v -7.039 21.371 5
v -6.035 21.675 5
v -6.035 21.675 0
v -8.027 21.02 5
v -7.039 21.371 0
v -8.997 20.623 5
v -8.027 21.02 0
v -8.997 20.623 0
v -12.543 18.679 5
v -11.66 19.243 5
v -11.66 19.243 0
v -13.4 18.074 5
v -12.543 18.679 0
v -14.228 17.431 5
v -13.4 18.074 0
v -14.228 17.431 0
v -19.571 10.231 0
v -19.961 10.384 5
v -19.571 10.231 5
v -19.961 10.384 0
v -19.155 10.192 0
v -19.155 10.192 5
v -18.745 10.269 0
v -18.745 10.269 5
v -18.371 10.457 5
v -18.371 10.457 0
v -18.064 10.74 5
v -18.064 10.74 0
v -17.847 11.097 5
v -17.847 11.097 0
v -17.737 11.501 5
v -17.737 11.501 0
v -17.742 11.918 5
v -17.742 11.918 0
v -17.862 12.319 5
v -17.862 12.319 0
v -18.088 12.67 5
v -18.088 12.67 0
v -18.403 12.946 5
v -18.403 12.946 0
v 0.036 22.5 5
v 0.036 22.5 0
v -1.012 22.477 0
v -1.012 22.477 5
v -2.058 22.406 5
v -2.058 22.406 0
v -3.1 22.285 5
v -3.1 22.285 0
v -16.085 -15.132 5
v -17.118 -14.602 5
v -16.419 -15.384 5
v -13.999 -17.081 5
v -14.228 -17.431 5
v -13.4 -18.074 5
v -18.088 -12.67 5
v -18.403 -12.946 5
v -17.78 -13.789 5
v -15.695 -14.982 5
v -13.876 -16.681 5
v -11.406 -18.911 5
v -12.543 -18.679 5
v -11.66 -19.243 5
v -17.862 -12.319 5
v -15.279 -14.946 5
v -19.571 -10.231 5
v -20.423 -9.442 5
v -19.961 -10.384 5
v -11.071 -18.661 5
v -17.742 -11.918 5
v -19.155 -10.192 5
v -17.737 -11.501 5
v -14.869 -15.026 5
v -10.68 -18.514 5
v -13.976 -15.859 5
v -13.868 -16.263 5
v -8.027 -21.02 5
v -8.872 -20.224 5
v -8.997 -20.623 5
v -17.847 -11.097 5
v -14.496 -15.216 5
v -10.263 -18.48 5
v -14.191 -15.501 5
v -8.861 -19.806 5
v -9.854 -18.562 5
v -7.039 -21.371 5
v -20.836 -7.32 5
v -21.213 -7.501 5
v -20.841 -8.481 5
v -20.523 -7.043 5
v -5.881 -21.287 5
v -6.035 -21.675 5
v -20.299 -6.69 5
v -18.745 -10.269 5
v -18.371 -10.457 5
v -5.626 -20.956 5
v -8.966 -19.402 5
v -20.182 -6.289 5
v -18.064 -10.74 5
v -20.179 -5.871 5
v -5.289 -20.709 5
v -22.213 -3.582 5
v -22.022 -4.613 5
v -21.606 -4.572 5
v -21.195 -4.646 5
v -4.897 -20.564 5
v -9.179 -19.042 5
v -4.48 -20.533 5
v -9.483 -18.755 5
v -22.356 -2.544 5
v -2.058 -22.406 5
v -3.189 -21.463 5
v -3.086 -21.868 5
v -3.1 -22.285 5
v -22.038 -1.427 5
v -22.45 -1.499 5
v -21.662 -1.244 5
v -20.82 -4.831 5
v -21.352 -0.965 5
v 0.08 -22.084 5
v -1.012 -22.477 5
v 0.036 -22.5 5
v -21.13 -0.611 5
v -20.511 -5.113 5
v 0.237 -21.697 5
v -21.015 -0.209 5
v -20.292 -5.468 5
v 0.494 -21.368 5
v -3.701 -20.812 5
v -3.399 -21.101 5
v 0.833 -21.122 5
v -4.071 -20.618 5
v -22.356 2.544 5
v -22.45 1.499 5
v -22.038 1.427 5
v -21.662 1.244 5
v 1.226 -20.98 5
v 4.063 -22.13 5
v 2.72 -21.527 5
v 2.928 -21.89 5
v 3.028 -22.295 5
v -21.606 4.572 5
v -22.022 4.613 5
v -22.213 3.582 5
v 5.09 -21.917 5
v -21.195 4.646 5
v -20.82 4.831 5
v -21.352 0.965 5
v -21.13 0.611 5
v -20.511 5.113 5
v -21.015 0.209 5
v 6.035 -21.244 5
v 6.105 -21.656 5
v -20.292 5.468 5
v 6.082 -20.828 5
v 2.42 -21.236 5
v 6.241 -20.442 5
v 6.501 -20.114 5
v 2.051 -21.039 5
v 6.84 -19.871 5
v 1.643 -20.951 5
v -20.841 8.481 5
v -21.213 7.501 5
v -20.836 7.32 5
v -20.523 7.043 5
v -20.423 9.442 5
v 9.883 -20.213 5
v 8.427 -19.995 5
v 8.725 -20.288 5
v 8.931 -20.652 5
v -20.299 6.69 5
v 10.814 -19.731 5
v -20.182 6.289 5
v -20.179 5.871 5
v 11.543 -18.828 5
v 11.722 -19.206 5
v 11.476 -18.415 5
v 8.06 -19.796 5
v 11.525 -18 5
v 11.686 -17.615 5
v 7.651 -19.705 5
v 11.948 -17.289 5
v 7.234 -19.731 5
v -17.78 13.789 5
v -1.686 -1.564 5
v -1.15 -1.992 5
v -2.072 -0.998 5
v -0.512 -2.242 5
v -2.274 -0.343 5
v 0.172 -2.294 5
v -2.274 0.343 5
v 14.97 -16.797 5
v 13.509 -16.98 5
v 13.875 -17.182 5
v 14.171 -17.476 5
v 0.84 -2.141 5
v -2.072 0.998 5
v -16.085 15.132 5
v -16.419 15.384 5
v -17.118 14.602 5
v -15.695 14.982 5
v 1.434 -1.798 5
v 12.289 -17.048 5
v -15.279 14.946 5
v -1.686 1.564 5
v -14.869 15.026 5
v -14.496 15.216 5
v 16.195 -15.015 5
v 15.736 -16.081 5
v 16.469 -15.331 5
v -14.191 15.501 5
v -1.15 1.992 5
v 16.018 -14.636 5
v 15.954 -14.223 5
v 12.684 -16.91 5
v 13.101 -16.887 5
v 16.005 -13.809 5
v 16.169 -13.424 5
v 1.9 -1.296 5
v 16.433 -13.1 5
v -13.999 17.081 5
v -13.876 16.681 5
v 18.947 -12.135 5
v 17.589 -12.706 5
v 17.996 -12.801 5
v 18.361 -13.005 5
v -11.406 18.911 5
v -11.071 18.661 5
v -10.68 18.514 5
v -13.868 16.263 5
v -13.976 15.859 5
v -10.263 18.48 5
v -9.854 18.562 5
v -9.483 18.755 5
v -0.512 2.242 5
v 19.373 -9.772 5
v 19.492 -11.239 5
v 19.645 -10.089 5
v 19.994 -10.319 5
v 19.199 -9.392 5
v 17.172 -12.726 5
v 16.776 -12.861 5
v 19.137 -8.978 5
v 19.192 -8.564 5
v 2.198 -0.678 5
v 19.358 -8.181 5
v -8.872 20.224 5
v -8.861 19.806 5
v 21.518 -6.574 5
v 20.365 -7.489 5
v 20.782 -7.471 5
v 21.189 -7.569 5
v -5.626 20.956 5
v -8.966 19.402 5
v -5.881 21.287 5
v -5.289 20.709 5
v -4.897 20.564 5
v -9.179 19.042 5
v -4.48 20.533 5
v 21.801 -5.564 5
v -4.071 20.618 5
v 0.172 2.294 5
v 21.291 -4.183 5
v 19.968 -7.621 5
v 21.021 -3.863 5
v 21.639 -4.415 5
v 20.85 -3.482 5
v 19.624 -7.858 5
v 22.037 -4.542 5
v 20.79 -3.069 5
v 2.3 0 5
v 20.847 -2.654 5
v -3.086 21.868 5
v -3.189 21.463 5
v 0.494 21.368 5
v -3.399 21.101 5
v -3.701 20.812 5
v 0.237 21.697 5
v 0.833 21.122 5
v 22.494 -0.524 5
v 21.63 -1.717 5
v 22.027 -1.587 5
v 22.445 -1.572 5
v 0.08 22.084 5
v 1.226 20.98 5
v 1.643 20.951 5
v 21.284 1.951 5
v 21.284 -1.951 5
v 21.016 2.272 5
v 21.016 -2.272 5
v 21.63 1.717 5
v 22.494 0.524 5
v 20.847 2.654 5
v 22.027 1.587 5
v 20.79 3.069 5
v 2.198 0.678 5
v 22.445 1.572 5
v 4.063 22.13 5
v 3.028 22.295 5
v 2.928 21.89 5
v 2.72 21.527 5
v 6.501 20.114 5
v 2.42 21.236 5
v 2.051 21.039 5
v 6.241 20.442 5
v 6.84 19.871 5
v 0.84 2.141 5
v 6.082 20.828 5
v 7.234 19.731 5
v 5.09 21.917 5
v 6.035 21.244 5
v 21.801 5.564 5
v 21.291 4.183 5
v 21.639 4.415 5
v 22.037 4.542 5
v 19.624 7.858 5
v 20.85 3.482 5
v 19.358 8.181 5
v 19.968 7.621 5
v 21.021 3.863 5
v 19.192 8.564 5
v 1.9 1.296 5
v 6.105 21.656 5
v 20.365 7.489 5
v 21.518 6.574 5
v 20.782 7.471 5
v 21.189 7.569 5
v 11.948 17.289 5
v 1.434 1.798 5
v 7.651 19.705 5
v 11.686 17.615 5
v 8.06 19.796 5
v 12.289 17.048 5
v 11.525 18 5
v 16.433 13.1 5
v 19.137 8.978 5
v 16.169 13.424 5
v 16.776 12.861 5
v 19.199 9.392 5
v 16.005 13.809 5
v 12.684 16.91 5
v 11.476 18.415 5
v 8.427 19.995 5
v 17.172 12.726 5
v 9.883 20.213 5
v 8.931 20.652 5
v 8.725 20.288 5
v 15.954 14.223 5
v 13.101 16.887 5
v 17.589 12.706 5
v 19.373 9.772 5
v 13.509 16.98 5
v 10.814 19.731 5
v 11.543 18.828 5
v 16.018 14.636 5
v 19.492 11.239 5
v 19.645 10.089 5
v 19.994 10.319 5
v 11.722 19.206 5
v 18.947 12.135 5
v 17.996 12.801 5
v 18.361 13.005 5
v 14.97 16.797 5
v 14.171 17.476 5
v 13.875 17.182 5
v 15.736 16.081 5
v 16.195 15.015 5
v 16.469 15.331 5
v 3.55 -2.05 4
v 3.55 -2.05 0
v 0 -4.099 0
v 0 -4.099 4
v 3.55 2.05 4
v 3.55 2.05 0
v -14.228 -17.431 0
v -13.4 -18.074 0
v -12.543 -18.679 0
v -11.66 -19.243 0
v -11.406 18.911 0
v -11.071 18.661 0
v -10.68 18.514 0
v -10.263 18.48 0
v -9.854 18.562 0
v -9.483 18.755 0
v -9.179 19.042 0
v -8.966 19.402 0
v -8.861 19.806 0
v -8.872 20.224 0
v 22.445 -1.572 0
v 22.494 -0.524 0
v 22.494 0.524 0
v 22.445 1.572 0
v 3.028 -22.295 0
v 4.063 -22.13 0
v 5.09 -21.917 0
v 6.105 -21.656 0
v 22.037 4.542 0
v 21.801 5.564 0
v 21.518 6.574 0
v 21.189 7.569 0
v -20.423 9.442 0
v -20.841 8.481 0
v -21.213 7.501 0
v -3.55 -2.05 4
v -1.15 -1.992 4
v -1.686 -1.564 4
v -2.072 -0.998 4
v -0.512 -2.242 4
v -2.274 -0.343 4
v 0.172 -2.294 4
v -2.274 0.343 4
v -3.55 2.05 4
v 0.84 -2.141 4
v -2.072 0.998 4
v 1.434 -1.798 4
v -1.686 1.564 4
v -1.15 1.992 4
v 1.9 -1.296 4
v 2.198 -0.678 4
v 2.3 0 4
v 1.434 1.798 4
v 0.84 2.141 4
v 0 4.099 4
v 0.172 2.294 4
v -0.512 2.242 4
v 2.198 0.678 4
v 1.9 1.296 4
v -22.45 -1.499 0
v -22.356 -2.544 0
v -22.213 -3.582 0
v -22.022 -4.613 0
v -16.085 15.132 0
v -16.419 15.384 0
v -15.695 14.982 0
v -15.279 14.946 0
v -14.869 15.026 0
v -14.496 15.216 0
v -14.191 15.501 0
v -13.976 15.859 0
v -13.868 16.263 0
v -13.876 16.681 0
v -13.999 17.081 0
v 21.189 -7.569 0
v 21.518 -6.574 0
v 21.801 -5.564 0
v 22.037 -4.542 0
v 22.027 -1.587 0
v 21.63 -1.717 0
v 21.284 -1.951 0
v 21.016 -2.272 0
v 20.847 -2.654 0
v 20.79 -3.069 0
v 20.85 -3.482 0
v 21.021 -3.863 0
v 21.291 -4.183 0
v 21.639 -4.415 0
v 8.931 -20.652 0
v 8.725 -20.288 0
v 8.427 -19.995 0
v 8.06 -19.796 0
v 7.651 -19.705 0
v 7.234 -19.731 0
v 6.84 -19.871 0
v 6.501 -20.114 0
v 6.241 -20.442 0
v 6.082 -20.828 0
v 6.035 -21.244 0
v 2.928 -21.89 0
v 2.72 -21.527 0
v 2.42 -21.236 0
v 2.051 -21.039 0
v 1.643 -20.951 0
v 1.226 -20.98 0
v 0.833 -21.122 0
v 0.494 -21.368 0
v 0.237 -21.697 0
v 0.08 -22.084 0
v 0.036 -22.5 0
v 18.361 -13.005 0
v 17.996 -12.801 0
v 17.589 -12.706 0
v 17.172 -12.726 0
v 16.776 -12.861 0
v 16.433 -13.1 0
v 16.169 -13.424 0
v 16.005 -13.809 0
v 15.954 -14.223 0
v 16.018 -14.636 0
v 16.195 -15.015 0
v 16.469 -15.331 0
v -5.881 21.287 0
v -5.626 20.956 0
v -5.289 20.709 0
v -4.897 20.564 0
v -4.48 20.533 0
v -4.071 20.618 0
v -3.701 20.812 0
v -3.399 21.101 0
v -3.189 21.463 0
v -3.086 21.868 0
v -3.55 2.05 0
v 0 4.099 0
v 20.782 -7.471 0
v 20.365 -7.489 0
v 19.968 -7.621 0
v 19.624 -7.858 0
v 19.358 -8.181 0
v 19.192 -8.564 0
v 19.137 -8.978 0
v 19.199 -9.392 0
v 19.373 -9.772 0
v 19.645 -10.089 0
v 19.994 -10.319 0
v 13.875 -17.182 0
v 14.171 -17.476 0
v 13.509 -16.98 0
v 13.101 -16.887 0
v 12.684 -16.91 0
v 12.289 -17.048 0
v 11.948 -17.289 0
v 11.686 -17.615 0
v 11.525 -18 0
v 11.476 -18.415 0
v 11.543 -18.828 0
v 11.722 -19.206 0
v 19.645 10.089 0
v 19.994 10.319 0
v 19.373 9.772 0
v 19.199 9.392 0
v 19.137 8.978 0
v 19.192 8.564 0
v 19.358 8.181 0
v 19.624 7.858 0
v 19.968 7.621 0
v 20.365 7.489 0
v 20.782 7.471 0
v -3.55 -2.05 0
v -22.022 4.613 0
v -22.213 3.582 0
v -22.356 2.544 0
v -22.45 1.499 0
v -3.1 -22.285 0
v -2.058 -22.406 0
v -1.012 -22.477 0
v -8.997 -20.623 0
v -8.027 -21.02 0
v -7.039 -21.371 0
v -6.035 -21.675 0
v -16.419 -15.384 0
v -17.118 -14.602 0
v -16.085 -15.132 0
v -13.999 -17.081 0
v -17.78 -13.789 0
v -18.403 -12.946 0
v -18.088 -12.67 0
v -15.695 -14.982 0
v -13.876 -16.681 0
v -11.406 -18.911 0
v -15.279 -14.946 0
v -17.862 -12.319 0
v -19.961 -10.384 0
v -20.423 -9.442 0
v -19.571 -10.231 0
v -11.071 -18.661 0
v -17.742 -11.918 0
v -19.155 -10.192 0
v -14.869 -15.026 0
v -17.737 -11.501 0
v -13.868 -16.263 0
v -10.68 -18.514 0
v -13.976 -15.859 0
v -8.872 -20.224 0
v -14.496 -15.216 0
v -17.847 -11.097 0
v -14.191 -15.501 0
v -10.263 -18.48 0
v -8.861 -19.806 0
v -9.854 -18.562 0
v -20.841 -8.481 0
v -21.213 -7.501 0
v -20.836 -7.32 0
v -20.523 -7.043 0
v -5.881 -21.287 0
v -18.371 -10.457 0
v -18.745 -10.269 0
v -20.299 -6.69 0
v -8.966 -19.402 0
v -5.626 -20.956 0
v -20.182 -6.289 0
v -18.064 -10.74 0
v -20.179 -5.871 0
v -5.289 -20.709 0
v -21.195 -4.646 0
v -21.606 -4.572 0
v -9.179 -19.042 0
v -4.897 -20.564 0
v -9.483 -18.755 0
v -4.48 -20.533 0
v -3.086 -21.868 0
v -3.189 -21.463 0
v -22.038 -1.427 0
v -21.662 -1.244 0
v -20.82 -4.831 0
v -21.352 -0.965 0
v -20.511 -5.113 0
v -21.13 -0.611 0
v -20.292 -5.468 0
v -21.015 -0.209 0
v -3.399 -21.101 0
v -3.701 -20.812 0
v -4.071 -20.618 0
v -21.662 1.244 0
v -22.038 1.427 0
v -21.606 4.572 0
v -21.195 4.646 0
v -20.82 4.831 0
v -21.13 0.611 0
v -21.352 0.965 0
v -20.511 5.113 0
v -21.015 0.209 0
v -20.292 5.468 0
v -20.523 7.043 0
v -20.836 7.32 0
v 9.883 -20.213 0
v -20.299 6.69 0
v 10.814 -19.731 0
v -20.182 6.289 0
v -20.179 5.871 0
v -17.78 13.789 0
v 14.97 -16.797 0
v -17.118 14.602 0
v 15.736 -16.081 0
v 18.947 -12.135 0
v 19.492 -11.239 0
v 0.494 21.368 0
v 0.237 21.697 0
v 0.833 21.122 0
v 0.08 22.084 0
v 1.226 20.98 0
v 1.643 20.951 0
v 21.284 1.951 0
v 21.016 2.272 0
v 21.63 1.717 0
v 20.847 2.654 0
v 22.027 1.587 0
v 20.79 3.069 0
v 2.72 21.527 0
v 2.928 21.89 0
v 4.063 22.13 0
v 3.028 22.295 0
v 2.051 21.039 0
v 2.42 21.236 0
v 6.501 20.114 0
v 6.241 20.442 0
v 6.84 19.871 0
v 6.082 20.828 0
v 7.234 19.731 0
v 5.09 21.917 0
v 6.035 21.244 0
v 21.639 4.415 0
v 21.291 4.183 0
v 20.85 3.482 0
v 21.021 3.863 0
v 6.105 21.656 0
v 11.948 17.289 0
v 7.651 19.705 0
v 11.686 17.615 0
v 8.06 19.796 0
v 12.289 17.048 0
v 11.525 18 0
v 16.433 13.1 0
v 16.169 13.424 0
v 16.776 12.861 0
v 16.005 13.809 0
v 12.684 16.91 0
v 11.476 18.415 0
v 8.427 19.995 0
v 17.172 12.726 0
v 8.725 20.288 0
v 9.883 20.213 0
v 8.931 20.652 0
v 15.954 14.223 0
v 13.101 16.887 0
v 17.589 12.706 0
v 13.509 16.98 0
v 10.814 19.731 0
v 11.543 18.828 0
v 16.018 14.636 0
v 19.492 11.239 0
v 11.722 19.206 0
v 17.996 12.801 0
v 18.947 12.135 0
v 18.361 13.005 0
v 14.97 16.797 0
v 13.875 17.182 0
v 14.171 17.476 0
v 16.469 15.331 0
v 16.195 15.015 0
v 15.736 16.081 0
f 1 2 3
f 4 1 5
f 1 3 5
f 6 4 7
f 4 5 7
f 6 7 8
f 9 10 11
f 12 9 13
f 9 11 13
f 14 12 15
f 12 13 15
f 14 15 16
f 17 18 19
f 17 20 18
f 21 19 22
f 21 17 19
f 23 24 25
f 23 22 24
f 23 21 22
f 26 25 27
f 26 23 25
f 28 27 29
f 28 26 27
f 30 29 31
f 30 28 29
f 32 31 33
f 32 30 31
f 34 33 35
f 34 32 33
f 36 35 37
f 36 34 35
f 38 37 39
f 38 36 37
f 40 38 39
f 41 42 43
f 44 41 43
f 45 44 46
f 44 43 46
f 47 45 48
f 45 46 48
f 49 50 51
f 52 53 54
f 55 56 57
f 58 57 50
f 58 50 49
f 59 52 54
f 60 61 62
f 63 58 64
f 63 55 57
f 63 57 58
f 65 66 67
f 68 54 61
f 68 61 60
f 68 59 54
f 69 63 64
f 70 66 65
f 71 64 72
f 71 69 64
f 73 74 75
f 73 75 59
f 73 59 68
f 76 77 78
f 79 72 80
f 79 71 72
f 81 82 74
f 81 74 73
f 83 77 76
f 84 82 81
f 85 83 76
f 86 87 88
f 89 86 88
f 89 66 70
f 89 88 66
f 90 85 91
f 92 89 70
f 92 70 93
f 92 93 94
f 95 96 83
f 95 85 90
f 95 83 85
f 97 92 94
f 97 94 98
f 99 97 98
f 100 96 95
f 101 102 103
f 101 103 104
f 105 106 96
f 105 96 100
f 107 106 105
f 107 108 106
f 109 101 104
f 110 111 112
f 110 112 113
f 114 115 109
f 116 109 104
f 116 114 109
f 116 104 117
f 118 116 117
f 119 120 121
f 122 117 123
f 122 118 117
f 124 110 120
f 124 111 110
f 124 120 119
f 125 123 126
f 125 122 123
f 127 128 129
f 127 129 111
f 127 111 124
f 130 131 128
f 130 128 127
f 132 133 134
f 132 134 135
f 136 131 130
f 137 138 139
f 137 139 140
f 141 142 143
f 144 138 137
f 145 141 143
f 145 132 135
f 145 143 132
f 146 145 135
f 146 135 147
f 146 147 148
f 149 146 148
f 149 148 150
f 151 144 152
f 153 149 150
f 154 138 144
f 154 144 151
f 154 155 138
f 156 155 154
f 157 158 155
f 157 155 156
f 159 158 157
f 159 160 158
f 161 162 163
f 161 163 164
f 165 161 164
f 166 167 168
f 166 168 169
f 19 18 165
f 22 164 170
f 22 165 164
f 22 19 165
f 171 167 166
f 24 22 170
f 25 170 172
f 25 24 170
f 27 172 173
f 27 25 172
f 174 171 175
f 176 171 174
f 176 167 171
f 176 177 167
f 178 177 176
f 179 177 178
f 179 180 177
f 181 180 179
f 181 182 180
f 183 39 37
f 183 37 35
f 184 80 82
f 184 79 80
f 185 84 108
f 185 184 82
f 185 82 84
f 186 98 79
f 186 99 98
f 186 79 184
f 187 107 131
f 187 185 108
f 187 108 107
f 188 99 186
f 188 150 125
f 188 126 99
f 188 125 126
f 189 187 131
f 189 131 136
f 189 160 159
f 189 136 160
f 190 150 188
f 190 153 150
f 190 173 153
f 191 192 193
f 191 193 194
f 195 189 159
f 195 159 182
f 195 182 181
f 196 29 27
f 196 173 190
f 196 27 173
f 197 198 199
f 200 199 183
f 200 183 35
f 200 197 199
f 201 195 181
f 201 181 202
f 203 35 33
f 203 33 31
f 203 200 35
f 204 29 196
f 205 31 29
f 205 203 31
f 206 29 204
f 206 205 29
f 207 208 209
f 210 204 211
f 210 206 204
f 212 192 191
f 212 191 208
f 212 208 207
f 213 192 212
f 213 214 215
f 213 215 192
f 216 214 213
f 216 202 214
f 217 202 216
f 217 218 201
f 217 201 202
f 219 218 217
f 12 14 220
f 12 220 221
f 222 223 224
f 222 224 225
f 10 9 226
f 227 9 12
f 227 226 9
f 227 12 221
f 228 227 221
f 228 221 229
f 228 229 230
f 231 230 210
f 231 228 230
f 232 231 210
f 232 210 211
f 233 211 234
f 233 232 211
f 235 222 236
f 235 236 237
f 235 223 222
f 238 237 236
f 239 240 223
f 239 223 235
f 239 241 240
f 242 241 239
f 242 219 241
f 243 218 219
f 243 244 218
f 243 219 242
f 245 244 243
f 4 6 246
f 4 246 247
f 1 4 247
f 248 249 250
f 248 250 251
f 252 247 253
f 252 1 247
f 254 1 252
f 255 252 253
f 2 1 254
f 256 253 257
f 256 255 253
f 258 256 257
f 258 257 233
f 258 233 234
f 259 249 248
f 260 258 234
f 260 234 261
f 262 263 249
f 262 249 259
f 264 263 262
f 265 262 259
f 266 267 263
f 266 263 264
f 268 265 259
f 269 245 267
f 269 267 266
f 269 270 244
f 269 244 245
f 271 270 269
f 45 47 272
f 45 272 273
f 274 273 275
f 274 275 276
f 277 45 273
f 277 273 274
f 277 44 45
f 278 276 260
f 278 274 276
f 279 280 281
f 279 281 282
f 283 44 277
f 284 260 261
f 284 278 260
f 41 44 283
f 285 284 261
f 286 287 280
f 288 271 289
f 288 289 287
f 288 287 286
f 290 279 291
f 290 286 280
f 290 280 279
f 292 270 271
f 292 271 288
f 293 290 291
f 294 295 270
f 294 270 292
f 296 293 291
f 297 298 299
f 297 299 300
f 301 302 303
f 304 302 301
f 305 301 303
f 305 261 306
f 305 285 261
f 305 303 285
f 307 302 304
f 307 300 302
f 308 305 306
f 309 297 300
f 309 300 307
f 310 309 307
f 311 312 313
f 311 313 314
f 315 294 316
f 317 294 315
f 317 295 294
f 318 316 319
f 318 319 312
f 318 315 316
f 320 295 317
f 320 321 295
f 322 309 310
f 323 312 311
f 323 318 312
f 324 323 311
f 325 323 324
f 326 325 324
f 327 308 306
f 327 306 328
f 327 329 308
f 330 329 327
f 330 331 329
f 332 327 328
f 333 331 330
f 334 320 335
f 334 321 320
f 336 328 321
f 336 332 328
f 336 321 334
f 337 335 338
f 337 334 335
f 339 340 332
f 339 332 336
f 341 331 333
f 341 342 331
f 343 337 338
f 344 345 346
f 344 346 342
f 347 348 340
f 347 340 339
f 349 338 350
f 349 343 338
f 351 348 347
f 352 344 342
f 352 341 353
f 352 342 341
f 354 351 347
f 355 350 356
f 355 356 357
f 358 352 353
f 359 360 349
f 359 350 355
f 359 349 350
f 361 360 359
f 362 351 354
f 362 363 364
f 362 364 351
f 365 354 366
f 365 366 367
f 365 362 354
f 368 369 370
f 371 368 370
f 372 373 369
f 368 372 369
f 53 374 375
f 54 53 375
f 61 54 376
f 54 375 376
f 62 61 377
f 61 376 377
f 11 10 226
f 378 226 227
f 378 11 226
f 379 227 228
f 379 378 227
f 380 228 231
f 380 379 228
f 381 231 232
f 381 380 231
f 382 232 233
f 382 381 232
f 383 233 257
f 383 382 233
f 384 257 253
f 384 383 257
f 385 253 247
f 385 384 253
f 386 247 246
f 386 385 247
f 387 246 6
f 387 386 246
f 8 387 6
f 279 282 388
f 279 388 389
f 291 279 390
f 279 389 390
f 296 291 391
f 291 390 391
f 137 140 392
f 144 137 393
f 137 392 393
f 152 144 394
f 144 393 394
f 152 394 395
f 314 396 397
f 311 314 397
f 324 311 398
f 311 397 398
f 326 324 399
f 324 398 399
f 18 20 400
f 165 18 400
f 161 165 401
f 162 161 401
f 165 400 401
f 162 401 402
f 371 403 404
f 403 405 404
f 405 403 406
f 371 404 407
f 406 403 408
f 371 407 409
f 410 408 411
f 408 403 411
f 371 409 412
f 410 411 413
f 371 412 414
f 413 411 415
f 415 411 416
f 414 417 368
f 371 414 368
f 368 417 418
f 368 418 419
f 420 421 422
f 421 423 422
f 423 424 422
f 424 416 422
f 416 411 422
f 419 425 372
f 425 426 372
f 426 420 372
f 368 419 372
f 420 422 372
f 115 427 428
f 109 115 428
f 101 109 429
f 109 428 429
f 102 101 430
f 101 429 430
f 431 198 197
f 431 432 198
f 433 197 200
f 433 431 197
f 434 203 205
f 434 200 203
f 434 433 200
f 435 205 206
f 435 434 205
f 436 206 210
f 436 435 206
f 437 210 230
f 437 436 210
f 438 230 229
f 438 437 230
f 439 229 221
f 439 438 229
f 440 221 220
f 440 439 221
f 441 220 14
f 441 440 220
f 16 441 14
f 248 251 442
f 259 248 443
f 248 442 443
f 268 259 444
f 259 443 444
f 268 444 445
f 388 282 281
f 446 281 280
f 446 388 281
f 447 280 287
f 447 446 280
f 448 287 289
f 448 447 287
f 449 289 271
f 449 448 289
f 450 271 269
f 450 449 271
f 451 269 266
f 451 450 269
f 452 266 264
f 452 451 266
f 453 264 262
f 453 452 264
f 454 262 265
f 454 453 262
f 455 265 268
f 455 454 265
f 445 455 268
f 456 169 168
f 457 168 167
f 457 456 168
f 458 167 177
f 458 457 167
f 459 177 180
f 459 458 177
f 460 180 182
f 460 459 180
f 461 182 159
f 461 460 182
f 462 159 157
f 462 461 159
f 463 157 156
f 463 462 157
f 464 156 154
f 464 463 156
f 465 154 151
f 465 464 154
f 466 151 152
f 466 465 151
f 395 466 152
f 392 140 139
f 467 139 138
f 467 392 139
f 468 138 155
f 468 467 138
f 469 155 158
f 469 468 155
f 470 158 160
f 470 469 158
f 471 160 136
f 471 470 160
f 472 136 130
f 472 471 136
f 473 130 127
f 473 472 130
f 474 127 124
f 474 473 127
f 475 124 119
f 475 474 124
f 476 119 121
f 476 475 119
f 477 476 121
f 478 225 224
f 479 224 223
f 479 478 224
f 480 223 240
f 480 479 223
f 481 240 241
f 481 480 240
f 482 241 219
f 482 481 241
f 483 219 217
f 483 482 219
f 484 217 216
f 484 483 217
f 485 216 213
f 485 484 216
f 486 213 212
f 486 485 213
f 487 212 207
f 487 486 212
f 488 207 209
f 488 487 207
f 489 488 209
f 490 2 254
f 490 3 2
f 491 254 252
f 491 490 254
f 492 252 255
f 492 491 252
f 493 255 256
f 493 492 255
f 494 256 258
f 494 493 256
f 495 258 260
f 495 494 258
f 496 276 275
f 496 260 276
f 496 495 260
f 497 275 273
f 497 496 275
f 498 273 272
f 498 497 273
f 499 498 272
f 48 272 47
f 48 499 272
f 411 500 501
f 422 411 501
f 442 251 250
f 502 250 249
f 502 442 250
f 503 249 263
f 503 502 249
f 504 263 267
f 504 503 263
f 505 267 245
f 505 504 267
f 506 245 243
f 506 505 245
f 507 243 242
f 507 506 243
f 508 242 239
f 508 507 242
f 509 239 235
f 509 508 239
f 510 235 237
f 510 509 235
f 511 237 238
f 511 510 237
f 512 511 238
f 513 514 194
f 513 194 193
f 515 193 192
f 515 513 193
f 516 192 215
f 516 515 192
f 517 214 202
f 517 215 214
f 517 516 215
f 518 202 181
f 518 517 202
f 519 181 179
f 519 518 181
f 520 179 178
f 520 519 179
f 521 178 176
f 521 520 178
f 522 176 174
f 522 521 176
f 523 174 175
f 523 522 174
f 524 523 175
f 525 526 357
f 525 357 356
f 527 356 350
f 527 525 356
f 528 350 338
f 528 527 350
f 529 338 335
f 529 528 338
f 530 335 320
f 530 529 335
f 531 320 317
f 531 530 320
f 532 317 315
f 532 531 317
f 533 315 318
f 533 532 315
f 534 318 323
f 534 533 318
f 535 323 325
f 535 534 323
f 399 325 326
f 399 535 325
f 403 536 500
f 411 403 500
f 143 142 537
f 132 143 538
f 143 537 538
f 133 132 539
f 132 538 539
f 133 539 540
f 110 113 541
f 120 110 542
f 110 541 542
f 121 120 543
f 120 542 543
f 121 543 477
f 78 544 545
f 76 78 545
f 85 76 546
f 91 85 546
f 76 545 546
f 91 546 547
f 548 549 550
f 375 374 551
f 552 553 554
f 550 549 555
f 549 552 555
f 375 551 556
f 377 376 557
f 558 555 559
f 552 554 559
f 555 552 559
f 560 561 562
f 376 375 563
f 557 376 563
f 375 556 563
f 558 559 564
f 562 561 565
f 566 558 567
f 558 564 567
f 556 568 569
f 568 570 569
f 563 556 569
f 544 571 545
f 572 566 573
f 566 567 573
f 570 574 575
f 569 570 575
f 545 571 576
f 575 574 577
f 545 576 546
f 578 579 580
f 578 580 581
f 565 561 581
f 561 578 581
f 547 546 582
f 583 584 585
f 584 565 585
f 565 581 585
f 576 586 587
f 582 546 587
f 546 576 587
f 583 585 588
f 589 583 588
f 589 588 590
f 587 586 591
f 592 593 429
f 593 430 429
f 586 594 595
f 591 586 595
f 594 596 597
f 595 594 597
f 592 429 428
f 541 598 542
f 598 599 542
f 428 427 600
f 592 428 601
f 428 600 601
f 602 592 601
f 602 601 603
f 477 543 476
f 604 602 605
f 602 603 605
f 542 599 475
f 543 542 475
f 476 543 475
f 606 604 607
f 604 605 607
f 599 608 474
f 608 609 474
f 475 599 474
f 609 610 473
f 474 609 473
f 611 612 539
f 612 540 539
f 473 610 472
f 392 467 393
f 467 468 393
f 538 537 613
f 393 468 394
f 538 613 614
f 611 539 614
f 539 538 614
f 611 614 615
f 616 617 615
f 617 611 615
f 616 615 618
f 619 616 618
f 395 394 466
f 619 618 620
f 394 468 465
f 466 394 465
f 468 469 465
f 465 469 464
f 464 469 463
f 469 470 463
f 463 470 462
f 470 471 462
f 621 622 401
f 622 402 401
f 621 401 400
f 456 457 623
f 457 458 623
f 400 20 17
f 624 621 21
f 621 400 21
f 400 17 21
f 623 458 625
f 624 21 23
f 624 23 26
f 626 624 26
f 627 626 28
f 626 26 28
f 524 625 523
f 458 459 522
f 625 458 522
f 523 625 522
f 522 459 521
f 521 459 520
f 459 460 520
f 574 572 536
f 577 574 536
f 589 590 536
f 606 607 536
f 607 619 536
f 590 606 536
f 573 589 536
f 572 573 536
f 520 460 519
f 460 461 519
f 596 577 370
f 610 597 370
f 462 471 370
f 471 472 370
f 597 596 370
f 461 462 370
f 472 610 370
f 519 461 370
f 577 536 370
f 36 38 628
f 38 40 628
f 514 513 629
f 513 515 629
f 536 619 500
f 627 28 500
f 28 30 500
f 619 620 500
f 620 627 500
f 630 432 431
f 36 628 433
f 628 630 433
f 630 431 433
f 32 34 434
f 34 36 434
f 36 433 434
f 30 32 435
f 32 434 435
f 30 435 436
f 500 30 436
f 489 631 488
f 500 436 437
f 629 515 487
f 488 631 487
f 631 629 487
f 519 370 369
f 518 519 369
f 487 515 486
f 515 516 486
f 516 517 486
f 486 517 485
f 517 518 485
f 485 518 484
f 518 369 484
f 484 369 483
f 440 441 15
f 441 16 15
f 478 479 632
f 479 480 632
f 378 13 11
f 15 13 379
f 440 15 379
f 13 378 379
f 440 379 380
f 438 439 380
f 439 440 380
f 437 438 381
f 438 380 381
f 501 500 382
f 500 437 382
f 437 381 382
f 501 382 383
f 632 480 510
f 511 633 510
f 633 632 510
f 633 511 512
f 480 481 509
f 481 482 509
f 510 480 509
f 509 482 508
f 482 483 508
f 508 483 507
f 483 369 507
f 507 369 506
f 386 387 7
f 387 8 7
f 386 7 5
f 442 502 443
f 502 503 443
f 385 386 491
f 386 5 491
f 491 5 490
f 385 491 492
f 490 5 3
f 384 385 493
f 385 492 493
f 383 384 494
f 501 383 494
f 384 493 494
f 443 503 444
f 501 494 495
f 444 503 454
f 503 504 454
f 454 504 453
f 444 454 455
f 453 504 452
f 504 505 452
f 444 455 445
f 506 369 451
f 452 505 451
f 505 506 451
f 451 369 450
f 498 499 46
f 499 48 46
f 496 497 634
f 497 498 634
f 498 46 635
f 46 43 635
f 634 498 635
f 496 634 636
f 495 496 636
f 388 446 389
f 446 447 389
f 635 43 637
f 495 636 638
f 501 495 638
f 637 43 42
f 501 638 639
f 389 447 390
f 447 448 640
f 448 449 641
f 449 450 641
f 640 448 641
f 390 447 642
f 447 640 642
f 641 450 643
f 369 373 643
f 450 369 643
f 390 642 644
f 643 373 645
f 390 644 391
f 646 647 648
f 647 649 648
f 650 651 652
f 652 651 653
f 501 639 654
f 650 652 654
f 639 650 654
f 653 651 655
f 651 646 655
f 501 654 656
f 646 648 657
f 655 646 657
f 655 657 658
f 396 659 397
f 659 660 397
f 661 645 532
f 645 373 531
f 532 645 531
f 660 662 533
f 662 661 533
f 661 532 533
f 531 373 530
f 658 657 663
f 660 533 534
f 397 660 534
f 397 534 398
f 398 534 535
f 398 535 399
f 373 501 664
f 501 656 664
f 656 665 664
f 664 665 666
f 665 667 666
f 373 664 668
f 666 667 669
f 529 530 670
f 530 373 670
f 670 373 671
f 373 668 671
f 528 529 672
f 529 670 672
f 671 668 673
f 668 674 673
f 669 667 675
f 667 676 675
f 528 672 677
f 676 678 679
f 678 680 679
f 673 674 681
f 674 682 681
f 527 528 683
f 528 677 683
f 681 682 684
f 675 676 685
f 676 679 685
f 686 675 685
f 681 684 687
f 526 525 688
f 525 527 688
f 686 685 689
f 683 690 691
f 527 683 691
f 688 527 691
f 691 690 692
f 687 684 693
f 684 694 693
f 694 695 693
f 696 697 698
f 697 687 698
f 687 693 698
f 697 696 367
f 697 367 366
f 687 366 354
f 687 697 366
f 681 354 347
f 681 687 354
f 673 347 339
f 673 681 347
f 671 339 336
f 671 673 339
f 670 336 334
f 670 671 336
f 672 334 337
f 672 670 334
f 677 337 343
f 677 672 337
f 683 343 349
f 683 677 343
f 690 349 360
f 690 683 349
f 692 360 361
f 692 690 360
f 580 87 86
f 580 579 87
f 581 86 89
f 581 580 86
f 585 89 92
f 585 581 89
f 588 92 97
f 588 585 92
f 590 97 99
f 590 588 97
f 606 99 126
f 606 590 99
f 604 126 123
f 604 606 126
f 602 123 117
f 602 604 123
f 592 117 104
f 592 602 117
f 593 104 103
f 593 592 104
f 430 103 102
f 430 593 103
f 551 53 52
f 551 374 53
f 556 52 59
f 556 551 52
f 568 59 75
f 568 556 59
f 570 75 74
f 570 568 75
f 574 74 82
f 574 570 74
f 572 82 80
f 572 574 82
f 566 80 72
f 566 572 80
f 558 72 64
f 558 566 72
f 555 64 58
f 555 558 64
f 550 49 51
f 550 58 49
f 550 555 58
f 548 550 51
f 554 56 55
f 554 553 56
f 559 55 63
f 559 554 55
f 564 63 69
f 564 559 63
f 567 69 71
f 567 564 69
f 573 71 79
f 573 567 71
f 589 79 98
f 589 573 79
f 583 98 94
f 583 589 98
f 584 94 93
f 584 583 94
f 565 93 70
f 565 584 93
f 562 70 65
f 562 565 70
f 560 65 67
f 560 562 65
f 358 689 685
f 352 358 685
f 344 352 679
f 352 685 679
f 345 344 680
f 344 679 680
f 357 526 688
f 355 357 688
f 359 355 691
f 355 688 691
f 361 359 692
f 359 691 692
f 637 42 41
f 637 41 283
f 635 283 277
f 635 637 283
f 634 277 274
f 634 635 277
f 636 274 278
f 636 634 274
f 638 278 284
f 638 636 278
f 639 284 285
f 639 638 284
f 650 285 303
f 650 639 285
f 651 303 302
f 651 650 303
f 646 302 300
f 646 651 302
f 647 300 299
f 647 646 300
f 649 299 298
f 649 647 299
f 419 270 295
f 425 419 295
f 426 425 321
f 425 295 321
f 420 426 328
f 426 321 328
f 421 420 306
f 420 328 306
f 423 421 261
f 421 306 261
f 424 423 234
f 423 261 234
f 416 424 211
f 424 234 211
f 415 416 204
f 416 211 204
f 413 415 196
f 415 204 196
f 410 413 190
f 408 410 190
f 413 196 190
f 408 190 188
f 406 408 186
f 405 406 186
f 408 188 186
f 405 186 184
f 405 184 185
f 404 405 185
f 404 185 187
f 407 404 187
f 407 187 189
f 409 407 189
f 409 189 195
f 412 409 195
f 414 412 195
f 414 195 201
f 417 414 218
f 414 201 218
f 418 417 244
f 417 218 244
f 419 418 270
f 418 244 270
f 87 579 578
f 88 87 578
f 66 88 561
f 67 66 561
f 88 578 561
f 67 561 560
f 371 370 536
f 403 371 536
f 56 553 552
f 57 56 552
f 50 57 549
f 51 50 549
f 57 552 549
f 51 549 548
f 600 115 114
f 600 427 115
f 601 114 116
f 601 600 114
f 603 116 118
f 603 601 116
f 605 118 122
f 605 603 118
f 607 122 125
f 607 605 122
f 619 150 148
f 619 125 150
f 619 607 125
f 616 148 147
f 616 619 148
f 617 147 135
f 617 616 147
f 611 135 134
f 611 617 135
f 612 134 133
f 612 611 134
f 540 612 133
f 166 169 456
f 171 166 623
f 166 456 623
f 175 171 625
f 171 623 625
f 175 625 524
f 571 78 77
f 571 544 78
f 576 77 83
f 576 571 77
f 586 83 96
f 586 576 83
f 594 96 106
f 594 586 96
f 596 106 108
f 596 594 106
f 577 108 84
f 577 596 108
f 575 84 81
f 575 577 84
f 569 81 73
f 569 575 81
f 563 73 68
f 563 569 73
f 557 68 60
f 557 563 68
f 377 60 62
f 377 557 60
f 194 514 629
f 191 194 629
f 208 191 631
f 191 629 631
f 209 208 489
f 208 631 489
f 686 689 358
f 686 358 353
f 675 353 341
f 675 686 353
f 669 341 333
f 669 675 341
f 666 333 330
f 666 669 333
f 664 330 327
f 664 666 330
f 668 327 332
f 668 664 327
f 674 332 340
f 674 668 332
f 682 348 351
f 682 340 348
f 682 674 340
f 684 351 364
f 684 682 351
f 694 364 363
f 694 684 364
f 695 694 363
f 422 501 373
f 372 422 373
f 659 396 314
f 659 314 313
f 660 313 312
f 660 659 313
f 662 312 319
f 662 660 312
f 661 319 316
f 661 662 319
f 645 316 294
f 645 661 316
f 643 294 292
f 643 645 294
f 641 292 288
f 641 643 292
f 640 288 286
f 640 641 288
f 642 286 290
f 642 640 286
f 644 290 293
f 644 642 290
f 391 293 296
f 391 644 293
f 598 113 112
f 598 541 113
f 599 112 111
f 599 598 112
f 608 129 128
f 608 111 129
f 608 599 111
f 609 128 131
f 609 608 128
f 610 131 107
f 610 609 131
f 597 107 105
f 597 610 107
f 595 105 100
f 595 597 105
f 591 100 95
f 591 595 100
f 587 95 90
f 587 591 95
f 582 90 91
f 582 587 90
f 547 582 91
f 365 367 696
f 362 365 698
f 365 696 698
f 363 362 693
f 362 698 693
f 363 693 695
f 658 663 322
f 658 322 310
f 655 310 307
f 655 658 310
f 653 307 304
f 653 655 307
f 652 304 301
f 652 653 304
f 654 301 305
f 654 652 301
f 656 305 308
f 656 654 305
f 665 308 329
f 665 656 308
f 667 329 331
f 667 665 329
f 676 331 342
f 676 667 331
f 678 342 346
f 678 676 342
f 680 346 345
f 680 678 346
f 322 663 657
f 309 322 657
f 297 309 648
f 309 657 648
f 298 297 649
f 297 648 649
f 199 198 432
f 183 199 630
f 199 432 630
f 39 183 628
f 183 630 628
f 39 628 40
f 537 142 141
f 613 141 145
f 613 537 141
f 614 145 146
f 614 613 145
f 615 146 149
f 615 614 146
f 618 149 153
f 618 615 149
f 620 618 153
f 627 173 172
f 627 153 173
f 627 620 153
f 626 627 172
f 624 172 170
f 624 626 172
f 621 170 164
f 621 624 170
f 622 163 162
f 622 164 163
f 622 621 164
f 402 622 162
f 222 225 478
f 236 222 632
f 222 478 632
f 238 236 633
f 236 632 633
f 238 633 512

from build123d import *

# Parameters (mm, degrees)
F0_R     = 22.5
F1_DEPTH = 5
F2_R     = 1.5
F3_DEPTH = 25
F4_R     = 5
F4_R_2   = 2.3
F5_DEPTH = 1


with BuildPart() as f1:
    # F0 (on Top) → F1 (new body)
    with BuildSketch(Plane.XY):
        Circle(F0_R)
        Polygon((-3.55, -2.049593), (-3.55, 2.049593), (0, 4.099187), (3.55, 2.049593), (3.55, -2.049593), (0, -4.099187), align=None, mode=Mode.SUBTRACT)
    extrude(amount=F1_DEPTH)

    # F2 (on Top) → F3 (cut)
    with BuildSketch(Plane.XY):
        with Locations((-22.5, 0)):
            Circle(F2_R)
        with Locations((-21.665639, -6.070427)):
            Circle(F2_R)
        with Locations((-19.224437, -11.690639)):
            Circle(F2_R)
        with Locations((-15.357446, -16.443809)):
            Circle(F2_R)
        with Locations((-10.351463, -19.977417)):
            Circle(F2_R)
        with Locations((-4.57776, -22.029392)):
            Circle(F2_R)
        with Locations((1.535454, -22.447547)):
            Circle(F2_R)
        with Locations((7.534791, -21.200871)):
            Circle(F2_R)
        with Locations((12.975307, -18.381823)):
            Circle(F2_R)
        with Locations((17.453504, -14.199479)):
            Circle(F2_R)
        with Locations((20.637254, -8.964025)):
            Circle(F2_R)
        with Locations((22.290434, -3.06375)):
            Circle(F2_R)
        with Locations((22.290434, 3.06375)):
            Circle(F2_R)
        with Locations((20.637254, 8.964025)):
            Circle(F2_R)
        with Locations((17.453504, 14.199479)):
            Circle(F2_R)
        with Locations((12.975307, 18.381823)):
            Circle(F2_R)
        with Locations((7.534791, 21.200871)):
            Circle(F2_R)
        with Locations((1.535454, 22.447547)):
            Circle(F2_R)
        with Locations((-4.57776, 22.029392)):
            Circle(F2_R)
        with Locations((-10.351463, 19.977417)):
            Circle(F2_R)
        with Locations((-15.357446, 16.443809)):
            Circle(F2_R)
        with Locations((-19.224437, 11.690639)):
            Circle(F2_R)
        with Locations((-21.665639, 6.070427)):
            Circle(F2_R)
    extrude(amount=F3_DEPTH, mode=Mode.SUBTRACT)

    # F4 (on face) → F5 (join)
    with BuildSketch(Plane.XY.offset(5)):
        Circle(F4_R)
        Circle(F4_R_2, mode=Mode.SUBTRACT)
    extrude(amount=-F5_DEPTH)


solid = f1.part
